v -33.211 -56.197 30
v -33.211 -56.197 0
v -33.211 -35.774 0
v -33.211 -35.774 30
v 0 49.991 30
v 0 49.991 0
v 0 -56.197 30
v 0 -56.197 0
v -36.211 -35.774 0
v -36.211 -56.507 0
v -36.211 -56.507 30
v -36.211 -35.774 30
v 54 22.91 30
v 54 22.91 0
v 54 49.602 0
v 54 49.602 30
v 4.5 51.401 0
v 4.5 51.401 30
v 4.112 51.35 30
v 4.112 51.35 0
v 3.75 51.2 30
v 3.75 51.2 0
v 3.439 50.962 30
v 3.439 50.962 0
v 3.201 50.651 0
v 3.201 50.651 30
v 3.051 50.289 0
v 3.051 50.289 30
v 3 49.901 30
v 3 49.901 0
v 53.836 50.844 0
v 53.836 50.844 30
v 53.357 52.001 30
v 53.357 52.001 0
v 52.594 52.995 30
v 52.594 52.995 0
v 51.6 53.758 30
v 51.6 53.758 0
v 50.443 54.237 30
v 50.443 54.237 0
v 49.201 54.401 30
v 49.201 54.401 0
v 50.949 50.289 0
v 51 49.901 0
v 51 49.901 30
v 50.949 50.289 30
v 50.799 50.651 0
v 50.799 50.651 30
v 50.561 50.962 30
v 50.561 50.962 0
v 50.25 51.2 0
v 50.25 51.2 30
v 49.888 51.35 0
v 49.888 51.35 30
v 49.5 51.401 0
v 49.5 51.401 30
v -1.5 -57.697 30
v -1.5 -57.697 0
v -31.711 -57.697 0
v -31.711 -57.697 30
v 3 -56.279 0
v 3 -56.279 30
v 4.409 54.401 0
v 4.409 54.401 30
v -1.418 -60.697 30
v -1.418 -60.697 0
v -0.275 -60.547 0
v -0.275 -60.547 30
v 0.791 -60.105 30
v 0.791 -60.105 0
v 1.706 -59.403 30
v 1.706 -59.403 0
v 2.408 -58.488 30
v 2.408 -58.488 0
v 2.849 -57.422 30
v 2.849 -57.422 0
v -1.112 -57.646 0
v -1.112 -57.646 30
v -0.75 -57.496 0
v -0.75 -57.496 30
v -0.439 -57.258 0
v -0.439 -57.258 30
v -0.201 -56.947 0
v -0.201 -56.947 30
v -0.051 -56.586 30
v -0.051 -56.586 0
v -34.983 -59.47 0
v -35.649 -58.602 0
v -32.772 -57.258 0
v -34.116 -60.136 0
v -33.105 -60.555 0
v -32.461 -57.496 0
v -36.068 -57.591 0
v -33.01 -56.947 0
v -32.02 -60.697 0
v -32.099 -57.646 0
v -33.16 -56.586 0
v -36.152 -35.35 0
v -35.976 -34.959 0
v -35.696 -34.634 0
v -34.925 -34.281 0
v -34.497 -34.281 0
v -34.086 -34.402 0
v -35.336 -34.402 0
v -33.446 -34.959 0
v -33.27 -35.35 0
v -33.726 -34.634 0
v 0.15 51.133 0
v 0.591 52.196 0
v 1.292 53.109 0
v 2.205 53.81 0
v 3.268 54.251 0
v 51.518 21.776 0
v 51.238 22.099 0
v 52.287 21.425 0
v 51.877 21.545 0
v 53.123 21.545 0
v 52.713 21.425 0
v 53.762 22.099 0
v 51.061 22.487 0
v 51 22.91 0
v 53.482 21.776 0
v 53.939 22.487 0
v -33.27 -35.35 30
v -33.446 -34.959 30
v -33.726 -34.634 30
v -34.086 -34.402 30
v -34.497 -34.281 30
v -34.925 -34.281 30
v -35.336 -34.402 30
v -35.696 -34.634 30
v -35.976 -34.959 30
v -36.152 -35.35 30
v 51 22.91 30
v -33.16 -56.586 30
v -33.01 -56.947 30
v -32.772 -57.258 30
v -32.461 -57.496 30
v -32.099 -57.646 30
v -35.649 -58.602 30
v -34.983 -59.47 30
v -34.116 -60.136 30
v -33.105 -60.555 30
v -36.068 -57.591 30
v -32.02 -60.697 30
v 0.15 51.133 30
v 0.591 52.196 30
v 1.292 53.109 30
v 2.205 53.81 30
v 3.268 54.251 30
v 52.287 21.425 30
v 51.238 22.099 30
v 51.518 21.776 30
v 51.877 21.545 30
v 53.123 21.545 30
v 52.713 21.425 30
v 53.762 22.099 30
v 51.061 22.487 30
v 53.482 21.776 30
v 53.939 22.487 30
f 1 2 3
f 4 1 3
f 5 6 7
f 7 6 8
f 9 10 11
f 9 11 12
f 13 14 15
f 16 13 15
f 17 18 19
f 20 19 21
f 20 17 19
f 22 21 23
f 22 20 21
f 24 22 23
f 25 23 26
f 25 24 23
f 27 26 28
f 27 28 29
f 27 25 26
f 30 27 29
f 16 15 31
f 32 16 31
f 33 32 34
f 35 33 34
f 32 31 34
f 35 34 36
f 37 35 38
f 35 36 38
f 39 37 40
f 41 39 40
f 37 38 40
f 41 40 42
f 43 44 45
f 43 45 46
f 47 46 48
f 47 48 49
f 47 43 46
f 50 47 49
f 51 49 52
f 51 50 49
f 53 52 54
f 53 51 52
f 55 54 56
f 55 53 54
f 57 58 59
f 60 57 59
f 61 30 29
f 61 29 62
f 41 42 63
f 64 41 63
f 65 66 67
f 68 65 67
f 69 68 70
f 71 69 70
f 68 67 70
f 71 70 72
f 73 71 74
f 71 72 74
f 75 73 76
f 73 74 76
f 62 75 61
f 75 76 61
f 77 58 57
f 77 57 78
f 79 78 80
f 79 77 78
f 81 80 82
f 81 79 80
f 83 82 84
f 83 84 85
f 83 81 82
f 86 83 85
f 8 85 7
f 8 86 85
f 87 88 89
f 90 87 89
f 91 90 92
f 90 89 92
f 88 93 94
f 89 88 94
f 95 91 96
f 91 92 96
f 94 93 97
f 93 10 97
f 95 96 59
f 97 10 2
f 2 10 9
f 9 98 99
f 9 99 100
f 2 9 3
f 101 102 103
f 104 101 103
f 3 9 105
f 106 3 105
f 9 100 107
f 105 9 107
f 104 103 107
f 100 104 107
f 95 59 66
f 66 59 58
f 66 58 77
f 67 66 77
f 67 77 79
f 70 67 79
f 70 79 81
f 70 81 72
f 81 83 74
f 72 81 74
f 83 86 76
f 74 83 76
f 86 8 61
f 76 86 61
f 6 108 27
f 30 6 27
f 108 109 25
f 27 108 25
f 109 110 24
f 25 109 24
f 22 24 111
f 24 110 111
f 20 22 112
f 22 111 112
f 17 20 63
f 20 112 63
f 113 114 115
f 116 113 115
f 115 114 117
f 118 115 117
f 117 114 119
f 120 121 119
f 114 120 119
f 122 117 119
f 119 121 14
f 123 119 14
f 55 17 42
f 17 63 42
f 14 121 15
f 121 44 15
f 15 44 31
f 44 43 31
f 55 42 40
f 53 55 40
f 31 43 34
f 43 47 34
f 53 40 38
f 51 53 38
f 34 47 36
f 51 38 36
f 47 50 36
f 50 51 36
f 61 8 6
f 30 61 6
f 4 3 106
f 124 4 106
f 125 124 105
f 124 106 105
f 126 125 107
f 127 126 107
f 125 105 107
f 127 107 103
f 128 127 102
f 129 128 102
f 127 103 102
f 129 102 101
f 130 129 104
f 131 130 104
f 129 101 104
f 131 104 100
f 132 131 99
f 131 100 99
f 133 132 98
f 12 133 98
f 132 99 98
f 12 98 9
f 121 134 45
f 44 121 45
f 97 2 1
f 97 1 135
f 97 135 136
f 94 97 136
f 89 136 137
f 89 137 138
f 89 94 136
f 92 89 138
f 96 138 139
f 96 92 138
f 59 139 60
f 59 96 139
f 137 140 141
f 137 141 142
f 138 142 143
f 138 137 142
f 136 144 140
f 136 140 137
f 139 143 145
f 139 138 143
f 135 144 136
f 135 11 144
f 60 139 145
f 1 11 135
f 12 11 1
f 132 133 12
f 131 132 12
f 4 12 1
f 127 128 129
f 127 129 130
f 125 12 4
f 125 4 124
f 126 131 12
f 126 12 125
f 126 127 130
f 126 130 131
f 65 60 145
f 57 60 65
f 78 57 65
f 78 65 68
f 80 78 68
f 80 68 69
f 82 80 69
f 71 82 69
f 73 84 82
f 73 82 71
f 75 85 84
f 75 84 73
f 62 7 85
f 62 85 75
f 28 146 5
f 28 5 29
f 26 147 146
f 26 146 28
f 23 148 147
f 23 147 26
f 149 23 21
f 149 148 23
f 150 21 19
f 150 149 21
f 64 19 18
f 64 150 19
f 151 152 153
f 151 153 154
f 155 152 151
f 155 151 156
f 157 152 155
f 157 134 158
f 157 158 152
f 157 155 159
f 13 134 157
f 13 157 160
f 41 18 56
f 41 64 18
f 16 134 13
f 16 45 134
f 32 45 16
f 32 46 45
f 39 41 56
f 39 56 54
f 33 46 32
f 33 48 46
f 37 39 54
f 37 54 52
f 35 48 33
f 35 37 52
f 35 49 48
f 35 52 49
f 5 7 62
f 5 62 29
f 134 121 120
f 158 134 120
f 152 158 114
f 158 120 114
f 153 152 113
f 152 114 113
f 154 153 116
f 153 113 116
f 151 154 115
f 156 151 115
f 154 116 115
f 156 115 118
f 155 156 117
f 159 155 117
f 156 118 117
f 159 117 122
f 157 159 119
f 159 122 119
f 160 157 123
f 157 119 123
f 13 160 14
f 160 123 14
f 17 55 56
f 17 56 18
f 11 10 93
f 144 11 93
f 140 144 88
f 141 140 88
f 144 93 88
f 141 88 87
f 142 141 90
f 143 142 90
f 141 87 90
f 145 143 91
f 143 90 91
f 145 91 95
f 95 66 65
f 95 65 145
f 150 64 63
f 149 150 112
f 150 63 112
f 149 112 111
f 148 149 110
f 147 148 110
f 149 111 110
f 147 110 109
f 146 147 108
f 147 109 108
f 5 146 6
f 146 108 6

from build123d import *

# Parameters (mm, degrees)
PAD_DEPTH = 30


with BuildPart() as part:
    # Sketch → Pad (new body)
    with BuildSketch(Plane.XY):
        with BuildLine():
            Line((54, 22.909644), (54, 49.60153))
            ThreePointArc((54, 49.60153), (52.594283, 52.995232), (49.200581, 54.400949))
            Line((49.200581, 54.400949), (4.409496, 54.400949))
            ThreePointArc((4.409496, 54.400949), (1.291512, 53.109437), (0, 49.991452))
            Line((0, 49.991452), (0, -56.197297))
            ThreePointArc((-1.5, -57.697297), (-0.43934, -57.257957), (0, -56.197297))
            Line((-1.5, -57.697297), (-31.710882, -57.697297))
            ThreePointArc((-33.210882, -56.197297), (-32.771543, -57.257957), (-31.710882, -57.697297))
            Line((-33.210882, -56.197297), (-33.210882, -35.774231))
            Line((-33.210934, -35.774231), (-33.210882, -35.774231))
            ThreePointArc((-33.210934, -35.774231), (-34.710834, -34.265328), (-36.210882, -35.774084))
            Line((-36.210882, -56.506556), (-36.210882, -35.774084))
            ThreePointArc((-36.210882, -56.506556), (-34.983443, -59.469857), (-32.020141, -60.697297))
            Line((-1.418408, -60.697297), (-32.020141, -60.697297))
            ThreePointArc((-1.418408, -60.697297), (1.705878, -59.403175), (3, -56.278889))
            Line((3, 49.900949), (3, -56.278889))
            ThreePointArc((4.5, 51.400949), (3.43934, 50.961609), (3, 49.900949))
            Line((49.5, 51.400949), (4.5, 51.400949))
            ThreePointArc((51, 49.900949), (50.56066, 50.961609), (49.5, 51.400949))
            Line((51, 22.909644), (51, 49.900949))
            ThreePointArc((51, 22.909644), (52.5, 21.409644), (54, 22.909644))
        make_face()
    extrude(amount=PAD_DEPTH)


solid = part.part
